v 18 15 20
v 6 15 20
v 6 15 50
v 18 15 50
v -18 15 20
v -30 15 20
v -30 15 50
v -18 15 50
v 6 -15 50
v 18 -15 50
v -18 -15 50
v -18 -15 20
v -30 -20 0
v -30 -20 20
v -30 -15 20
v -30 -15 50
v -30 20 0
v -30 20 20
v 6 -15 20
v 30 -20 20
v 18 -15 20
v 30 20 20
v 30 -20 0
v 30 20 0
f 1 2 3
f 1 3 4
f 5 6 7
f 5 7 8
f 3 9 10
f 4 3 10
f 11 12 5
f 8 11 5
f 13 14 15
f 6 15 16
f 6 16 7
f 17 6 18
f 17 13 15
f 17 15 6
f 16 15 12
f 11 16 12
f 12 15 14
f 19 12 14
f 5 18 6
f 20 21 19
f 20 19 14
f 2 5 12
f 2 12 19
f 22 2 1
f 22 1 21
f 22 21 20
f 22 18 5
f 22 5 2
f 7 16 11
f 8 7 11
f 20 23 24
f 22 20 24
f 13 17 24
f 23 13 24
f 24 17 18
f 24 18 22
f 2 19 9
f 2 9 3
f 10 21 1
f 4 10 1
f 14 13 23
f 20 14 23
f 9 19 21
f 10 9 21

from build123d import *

# Parameters (mm, degrees)
SKETCH_8_W      = 60
SKETCH_8_H      = 40
EXTRUDE_1_DEPTH = 20
SKETCH_9_W      = 12
SKETCH_9_H      = 30
EXTRUDE_2_DEPTH = 30
SKETCH_10_W     = 12
SKETCH_10_H     = 30
EXTRUDE_3_DEPTH = 30


with BuildPart() as part:
    # 草图8 → 凸台-拉伸1 (new body)
    with BuildSketch(Plane.XY):
        Rectangle(SKETCH_8_W, SKETCH_8_H)
    extrude(amount=EXTRUDE_1_DEPTH)

    # 草图9 → 凸台-拉伸2 (add)
    with BuildSketch(Plane.XY.offset(20)):
        with Locations((-24, 0)):
            Rectangle(SKETCH_9_W, SKETCH_9_H)
    extrude(amount=EXTRUDE_2_DEPTH)

    # 草图10 → 凸台-拉伸3 (add)
    with BuildSketch(Plane.XY.offset(20)):
        with Locations((12, 0)):
            Rectangle(SKETCH_10_W, SKETCH_10_H)
    extrude(amount=EXTRUDE_3_DEPTH)


solid = part.part
